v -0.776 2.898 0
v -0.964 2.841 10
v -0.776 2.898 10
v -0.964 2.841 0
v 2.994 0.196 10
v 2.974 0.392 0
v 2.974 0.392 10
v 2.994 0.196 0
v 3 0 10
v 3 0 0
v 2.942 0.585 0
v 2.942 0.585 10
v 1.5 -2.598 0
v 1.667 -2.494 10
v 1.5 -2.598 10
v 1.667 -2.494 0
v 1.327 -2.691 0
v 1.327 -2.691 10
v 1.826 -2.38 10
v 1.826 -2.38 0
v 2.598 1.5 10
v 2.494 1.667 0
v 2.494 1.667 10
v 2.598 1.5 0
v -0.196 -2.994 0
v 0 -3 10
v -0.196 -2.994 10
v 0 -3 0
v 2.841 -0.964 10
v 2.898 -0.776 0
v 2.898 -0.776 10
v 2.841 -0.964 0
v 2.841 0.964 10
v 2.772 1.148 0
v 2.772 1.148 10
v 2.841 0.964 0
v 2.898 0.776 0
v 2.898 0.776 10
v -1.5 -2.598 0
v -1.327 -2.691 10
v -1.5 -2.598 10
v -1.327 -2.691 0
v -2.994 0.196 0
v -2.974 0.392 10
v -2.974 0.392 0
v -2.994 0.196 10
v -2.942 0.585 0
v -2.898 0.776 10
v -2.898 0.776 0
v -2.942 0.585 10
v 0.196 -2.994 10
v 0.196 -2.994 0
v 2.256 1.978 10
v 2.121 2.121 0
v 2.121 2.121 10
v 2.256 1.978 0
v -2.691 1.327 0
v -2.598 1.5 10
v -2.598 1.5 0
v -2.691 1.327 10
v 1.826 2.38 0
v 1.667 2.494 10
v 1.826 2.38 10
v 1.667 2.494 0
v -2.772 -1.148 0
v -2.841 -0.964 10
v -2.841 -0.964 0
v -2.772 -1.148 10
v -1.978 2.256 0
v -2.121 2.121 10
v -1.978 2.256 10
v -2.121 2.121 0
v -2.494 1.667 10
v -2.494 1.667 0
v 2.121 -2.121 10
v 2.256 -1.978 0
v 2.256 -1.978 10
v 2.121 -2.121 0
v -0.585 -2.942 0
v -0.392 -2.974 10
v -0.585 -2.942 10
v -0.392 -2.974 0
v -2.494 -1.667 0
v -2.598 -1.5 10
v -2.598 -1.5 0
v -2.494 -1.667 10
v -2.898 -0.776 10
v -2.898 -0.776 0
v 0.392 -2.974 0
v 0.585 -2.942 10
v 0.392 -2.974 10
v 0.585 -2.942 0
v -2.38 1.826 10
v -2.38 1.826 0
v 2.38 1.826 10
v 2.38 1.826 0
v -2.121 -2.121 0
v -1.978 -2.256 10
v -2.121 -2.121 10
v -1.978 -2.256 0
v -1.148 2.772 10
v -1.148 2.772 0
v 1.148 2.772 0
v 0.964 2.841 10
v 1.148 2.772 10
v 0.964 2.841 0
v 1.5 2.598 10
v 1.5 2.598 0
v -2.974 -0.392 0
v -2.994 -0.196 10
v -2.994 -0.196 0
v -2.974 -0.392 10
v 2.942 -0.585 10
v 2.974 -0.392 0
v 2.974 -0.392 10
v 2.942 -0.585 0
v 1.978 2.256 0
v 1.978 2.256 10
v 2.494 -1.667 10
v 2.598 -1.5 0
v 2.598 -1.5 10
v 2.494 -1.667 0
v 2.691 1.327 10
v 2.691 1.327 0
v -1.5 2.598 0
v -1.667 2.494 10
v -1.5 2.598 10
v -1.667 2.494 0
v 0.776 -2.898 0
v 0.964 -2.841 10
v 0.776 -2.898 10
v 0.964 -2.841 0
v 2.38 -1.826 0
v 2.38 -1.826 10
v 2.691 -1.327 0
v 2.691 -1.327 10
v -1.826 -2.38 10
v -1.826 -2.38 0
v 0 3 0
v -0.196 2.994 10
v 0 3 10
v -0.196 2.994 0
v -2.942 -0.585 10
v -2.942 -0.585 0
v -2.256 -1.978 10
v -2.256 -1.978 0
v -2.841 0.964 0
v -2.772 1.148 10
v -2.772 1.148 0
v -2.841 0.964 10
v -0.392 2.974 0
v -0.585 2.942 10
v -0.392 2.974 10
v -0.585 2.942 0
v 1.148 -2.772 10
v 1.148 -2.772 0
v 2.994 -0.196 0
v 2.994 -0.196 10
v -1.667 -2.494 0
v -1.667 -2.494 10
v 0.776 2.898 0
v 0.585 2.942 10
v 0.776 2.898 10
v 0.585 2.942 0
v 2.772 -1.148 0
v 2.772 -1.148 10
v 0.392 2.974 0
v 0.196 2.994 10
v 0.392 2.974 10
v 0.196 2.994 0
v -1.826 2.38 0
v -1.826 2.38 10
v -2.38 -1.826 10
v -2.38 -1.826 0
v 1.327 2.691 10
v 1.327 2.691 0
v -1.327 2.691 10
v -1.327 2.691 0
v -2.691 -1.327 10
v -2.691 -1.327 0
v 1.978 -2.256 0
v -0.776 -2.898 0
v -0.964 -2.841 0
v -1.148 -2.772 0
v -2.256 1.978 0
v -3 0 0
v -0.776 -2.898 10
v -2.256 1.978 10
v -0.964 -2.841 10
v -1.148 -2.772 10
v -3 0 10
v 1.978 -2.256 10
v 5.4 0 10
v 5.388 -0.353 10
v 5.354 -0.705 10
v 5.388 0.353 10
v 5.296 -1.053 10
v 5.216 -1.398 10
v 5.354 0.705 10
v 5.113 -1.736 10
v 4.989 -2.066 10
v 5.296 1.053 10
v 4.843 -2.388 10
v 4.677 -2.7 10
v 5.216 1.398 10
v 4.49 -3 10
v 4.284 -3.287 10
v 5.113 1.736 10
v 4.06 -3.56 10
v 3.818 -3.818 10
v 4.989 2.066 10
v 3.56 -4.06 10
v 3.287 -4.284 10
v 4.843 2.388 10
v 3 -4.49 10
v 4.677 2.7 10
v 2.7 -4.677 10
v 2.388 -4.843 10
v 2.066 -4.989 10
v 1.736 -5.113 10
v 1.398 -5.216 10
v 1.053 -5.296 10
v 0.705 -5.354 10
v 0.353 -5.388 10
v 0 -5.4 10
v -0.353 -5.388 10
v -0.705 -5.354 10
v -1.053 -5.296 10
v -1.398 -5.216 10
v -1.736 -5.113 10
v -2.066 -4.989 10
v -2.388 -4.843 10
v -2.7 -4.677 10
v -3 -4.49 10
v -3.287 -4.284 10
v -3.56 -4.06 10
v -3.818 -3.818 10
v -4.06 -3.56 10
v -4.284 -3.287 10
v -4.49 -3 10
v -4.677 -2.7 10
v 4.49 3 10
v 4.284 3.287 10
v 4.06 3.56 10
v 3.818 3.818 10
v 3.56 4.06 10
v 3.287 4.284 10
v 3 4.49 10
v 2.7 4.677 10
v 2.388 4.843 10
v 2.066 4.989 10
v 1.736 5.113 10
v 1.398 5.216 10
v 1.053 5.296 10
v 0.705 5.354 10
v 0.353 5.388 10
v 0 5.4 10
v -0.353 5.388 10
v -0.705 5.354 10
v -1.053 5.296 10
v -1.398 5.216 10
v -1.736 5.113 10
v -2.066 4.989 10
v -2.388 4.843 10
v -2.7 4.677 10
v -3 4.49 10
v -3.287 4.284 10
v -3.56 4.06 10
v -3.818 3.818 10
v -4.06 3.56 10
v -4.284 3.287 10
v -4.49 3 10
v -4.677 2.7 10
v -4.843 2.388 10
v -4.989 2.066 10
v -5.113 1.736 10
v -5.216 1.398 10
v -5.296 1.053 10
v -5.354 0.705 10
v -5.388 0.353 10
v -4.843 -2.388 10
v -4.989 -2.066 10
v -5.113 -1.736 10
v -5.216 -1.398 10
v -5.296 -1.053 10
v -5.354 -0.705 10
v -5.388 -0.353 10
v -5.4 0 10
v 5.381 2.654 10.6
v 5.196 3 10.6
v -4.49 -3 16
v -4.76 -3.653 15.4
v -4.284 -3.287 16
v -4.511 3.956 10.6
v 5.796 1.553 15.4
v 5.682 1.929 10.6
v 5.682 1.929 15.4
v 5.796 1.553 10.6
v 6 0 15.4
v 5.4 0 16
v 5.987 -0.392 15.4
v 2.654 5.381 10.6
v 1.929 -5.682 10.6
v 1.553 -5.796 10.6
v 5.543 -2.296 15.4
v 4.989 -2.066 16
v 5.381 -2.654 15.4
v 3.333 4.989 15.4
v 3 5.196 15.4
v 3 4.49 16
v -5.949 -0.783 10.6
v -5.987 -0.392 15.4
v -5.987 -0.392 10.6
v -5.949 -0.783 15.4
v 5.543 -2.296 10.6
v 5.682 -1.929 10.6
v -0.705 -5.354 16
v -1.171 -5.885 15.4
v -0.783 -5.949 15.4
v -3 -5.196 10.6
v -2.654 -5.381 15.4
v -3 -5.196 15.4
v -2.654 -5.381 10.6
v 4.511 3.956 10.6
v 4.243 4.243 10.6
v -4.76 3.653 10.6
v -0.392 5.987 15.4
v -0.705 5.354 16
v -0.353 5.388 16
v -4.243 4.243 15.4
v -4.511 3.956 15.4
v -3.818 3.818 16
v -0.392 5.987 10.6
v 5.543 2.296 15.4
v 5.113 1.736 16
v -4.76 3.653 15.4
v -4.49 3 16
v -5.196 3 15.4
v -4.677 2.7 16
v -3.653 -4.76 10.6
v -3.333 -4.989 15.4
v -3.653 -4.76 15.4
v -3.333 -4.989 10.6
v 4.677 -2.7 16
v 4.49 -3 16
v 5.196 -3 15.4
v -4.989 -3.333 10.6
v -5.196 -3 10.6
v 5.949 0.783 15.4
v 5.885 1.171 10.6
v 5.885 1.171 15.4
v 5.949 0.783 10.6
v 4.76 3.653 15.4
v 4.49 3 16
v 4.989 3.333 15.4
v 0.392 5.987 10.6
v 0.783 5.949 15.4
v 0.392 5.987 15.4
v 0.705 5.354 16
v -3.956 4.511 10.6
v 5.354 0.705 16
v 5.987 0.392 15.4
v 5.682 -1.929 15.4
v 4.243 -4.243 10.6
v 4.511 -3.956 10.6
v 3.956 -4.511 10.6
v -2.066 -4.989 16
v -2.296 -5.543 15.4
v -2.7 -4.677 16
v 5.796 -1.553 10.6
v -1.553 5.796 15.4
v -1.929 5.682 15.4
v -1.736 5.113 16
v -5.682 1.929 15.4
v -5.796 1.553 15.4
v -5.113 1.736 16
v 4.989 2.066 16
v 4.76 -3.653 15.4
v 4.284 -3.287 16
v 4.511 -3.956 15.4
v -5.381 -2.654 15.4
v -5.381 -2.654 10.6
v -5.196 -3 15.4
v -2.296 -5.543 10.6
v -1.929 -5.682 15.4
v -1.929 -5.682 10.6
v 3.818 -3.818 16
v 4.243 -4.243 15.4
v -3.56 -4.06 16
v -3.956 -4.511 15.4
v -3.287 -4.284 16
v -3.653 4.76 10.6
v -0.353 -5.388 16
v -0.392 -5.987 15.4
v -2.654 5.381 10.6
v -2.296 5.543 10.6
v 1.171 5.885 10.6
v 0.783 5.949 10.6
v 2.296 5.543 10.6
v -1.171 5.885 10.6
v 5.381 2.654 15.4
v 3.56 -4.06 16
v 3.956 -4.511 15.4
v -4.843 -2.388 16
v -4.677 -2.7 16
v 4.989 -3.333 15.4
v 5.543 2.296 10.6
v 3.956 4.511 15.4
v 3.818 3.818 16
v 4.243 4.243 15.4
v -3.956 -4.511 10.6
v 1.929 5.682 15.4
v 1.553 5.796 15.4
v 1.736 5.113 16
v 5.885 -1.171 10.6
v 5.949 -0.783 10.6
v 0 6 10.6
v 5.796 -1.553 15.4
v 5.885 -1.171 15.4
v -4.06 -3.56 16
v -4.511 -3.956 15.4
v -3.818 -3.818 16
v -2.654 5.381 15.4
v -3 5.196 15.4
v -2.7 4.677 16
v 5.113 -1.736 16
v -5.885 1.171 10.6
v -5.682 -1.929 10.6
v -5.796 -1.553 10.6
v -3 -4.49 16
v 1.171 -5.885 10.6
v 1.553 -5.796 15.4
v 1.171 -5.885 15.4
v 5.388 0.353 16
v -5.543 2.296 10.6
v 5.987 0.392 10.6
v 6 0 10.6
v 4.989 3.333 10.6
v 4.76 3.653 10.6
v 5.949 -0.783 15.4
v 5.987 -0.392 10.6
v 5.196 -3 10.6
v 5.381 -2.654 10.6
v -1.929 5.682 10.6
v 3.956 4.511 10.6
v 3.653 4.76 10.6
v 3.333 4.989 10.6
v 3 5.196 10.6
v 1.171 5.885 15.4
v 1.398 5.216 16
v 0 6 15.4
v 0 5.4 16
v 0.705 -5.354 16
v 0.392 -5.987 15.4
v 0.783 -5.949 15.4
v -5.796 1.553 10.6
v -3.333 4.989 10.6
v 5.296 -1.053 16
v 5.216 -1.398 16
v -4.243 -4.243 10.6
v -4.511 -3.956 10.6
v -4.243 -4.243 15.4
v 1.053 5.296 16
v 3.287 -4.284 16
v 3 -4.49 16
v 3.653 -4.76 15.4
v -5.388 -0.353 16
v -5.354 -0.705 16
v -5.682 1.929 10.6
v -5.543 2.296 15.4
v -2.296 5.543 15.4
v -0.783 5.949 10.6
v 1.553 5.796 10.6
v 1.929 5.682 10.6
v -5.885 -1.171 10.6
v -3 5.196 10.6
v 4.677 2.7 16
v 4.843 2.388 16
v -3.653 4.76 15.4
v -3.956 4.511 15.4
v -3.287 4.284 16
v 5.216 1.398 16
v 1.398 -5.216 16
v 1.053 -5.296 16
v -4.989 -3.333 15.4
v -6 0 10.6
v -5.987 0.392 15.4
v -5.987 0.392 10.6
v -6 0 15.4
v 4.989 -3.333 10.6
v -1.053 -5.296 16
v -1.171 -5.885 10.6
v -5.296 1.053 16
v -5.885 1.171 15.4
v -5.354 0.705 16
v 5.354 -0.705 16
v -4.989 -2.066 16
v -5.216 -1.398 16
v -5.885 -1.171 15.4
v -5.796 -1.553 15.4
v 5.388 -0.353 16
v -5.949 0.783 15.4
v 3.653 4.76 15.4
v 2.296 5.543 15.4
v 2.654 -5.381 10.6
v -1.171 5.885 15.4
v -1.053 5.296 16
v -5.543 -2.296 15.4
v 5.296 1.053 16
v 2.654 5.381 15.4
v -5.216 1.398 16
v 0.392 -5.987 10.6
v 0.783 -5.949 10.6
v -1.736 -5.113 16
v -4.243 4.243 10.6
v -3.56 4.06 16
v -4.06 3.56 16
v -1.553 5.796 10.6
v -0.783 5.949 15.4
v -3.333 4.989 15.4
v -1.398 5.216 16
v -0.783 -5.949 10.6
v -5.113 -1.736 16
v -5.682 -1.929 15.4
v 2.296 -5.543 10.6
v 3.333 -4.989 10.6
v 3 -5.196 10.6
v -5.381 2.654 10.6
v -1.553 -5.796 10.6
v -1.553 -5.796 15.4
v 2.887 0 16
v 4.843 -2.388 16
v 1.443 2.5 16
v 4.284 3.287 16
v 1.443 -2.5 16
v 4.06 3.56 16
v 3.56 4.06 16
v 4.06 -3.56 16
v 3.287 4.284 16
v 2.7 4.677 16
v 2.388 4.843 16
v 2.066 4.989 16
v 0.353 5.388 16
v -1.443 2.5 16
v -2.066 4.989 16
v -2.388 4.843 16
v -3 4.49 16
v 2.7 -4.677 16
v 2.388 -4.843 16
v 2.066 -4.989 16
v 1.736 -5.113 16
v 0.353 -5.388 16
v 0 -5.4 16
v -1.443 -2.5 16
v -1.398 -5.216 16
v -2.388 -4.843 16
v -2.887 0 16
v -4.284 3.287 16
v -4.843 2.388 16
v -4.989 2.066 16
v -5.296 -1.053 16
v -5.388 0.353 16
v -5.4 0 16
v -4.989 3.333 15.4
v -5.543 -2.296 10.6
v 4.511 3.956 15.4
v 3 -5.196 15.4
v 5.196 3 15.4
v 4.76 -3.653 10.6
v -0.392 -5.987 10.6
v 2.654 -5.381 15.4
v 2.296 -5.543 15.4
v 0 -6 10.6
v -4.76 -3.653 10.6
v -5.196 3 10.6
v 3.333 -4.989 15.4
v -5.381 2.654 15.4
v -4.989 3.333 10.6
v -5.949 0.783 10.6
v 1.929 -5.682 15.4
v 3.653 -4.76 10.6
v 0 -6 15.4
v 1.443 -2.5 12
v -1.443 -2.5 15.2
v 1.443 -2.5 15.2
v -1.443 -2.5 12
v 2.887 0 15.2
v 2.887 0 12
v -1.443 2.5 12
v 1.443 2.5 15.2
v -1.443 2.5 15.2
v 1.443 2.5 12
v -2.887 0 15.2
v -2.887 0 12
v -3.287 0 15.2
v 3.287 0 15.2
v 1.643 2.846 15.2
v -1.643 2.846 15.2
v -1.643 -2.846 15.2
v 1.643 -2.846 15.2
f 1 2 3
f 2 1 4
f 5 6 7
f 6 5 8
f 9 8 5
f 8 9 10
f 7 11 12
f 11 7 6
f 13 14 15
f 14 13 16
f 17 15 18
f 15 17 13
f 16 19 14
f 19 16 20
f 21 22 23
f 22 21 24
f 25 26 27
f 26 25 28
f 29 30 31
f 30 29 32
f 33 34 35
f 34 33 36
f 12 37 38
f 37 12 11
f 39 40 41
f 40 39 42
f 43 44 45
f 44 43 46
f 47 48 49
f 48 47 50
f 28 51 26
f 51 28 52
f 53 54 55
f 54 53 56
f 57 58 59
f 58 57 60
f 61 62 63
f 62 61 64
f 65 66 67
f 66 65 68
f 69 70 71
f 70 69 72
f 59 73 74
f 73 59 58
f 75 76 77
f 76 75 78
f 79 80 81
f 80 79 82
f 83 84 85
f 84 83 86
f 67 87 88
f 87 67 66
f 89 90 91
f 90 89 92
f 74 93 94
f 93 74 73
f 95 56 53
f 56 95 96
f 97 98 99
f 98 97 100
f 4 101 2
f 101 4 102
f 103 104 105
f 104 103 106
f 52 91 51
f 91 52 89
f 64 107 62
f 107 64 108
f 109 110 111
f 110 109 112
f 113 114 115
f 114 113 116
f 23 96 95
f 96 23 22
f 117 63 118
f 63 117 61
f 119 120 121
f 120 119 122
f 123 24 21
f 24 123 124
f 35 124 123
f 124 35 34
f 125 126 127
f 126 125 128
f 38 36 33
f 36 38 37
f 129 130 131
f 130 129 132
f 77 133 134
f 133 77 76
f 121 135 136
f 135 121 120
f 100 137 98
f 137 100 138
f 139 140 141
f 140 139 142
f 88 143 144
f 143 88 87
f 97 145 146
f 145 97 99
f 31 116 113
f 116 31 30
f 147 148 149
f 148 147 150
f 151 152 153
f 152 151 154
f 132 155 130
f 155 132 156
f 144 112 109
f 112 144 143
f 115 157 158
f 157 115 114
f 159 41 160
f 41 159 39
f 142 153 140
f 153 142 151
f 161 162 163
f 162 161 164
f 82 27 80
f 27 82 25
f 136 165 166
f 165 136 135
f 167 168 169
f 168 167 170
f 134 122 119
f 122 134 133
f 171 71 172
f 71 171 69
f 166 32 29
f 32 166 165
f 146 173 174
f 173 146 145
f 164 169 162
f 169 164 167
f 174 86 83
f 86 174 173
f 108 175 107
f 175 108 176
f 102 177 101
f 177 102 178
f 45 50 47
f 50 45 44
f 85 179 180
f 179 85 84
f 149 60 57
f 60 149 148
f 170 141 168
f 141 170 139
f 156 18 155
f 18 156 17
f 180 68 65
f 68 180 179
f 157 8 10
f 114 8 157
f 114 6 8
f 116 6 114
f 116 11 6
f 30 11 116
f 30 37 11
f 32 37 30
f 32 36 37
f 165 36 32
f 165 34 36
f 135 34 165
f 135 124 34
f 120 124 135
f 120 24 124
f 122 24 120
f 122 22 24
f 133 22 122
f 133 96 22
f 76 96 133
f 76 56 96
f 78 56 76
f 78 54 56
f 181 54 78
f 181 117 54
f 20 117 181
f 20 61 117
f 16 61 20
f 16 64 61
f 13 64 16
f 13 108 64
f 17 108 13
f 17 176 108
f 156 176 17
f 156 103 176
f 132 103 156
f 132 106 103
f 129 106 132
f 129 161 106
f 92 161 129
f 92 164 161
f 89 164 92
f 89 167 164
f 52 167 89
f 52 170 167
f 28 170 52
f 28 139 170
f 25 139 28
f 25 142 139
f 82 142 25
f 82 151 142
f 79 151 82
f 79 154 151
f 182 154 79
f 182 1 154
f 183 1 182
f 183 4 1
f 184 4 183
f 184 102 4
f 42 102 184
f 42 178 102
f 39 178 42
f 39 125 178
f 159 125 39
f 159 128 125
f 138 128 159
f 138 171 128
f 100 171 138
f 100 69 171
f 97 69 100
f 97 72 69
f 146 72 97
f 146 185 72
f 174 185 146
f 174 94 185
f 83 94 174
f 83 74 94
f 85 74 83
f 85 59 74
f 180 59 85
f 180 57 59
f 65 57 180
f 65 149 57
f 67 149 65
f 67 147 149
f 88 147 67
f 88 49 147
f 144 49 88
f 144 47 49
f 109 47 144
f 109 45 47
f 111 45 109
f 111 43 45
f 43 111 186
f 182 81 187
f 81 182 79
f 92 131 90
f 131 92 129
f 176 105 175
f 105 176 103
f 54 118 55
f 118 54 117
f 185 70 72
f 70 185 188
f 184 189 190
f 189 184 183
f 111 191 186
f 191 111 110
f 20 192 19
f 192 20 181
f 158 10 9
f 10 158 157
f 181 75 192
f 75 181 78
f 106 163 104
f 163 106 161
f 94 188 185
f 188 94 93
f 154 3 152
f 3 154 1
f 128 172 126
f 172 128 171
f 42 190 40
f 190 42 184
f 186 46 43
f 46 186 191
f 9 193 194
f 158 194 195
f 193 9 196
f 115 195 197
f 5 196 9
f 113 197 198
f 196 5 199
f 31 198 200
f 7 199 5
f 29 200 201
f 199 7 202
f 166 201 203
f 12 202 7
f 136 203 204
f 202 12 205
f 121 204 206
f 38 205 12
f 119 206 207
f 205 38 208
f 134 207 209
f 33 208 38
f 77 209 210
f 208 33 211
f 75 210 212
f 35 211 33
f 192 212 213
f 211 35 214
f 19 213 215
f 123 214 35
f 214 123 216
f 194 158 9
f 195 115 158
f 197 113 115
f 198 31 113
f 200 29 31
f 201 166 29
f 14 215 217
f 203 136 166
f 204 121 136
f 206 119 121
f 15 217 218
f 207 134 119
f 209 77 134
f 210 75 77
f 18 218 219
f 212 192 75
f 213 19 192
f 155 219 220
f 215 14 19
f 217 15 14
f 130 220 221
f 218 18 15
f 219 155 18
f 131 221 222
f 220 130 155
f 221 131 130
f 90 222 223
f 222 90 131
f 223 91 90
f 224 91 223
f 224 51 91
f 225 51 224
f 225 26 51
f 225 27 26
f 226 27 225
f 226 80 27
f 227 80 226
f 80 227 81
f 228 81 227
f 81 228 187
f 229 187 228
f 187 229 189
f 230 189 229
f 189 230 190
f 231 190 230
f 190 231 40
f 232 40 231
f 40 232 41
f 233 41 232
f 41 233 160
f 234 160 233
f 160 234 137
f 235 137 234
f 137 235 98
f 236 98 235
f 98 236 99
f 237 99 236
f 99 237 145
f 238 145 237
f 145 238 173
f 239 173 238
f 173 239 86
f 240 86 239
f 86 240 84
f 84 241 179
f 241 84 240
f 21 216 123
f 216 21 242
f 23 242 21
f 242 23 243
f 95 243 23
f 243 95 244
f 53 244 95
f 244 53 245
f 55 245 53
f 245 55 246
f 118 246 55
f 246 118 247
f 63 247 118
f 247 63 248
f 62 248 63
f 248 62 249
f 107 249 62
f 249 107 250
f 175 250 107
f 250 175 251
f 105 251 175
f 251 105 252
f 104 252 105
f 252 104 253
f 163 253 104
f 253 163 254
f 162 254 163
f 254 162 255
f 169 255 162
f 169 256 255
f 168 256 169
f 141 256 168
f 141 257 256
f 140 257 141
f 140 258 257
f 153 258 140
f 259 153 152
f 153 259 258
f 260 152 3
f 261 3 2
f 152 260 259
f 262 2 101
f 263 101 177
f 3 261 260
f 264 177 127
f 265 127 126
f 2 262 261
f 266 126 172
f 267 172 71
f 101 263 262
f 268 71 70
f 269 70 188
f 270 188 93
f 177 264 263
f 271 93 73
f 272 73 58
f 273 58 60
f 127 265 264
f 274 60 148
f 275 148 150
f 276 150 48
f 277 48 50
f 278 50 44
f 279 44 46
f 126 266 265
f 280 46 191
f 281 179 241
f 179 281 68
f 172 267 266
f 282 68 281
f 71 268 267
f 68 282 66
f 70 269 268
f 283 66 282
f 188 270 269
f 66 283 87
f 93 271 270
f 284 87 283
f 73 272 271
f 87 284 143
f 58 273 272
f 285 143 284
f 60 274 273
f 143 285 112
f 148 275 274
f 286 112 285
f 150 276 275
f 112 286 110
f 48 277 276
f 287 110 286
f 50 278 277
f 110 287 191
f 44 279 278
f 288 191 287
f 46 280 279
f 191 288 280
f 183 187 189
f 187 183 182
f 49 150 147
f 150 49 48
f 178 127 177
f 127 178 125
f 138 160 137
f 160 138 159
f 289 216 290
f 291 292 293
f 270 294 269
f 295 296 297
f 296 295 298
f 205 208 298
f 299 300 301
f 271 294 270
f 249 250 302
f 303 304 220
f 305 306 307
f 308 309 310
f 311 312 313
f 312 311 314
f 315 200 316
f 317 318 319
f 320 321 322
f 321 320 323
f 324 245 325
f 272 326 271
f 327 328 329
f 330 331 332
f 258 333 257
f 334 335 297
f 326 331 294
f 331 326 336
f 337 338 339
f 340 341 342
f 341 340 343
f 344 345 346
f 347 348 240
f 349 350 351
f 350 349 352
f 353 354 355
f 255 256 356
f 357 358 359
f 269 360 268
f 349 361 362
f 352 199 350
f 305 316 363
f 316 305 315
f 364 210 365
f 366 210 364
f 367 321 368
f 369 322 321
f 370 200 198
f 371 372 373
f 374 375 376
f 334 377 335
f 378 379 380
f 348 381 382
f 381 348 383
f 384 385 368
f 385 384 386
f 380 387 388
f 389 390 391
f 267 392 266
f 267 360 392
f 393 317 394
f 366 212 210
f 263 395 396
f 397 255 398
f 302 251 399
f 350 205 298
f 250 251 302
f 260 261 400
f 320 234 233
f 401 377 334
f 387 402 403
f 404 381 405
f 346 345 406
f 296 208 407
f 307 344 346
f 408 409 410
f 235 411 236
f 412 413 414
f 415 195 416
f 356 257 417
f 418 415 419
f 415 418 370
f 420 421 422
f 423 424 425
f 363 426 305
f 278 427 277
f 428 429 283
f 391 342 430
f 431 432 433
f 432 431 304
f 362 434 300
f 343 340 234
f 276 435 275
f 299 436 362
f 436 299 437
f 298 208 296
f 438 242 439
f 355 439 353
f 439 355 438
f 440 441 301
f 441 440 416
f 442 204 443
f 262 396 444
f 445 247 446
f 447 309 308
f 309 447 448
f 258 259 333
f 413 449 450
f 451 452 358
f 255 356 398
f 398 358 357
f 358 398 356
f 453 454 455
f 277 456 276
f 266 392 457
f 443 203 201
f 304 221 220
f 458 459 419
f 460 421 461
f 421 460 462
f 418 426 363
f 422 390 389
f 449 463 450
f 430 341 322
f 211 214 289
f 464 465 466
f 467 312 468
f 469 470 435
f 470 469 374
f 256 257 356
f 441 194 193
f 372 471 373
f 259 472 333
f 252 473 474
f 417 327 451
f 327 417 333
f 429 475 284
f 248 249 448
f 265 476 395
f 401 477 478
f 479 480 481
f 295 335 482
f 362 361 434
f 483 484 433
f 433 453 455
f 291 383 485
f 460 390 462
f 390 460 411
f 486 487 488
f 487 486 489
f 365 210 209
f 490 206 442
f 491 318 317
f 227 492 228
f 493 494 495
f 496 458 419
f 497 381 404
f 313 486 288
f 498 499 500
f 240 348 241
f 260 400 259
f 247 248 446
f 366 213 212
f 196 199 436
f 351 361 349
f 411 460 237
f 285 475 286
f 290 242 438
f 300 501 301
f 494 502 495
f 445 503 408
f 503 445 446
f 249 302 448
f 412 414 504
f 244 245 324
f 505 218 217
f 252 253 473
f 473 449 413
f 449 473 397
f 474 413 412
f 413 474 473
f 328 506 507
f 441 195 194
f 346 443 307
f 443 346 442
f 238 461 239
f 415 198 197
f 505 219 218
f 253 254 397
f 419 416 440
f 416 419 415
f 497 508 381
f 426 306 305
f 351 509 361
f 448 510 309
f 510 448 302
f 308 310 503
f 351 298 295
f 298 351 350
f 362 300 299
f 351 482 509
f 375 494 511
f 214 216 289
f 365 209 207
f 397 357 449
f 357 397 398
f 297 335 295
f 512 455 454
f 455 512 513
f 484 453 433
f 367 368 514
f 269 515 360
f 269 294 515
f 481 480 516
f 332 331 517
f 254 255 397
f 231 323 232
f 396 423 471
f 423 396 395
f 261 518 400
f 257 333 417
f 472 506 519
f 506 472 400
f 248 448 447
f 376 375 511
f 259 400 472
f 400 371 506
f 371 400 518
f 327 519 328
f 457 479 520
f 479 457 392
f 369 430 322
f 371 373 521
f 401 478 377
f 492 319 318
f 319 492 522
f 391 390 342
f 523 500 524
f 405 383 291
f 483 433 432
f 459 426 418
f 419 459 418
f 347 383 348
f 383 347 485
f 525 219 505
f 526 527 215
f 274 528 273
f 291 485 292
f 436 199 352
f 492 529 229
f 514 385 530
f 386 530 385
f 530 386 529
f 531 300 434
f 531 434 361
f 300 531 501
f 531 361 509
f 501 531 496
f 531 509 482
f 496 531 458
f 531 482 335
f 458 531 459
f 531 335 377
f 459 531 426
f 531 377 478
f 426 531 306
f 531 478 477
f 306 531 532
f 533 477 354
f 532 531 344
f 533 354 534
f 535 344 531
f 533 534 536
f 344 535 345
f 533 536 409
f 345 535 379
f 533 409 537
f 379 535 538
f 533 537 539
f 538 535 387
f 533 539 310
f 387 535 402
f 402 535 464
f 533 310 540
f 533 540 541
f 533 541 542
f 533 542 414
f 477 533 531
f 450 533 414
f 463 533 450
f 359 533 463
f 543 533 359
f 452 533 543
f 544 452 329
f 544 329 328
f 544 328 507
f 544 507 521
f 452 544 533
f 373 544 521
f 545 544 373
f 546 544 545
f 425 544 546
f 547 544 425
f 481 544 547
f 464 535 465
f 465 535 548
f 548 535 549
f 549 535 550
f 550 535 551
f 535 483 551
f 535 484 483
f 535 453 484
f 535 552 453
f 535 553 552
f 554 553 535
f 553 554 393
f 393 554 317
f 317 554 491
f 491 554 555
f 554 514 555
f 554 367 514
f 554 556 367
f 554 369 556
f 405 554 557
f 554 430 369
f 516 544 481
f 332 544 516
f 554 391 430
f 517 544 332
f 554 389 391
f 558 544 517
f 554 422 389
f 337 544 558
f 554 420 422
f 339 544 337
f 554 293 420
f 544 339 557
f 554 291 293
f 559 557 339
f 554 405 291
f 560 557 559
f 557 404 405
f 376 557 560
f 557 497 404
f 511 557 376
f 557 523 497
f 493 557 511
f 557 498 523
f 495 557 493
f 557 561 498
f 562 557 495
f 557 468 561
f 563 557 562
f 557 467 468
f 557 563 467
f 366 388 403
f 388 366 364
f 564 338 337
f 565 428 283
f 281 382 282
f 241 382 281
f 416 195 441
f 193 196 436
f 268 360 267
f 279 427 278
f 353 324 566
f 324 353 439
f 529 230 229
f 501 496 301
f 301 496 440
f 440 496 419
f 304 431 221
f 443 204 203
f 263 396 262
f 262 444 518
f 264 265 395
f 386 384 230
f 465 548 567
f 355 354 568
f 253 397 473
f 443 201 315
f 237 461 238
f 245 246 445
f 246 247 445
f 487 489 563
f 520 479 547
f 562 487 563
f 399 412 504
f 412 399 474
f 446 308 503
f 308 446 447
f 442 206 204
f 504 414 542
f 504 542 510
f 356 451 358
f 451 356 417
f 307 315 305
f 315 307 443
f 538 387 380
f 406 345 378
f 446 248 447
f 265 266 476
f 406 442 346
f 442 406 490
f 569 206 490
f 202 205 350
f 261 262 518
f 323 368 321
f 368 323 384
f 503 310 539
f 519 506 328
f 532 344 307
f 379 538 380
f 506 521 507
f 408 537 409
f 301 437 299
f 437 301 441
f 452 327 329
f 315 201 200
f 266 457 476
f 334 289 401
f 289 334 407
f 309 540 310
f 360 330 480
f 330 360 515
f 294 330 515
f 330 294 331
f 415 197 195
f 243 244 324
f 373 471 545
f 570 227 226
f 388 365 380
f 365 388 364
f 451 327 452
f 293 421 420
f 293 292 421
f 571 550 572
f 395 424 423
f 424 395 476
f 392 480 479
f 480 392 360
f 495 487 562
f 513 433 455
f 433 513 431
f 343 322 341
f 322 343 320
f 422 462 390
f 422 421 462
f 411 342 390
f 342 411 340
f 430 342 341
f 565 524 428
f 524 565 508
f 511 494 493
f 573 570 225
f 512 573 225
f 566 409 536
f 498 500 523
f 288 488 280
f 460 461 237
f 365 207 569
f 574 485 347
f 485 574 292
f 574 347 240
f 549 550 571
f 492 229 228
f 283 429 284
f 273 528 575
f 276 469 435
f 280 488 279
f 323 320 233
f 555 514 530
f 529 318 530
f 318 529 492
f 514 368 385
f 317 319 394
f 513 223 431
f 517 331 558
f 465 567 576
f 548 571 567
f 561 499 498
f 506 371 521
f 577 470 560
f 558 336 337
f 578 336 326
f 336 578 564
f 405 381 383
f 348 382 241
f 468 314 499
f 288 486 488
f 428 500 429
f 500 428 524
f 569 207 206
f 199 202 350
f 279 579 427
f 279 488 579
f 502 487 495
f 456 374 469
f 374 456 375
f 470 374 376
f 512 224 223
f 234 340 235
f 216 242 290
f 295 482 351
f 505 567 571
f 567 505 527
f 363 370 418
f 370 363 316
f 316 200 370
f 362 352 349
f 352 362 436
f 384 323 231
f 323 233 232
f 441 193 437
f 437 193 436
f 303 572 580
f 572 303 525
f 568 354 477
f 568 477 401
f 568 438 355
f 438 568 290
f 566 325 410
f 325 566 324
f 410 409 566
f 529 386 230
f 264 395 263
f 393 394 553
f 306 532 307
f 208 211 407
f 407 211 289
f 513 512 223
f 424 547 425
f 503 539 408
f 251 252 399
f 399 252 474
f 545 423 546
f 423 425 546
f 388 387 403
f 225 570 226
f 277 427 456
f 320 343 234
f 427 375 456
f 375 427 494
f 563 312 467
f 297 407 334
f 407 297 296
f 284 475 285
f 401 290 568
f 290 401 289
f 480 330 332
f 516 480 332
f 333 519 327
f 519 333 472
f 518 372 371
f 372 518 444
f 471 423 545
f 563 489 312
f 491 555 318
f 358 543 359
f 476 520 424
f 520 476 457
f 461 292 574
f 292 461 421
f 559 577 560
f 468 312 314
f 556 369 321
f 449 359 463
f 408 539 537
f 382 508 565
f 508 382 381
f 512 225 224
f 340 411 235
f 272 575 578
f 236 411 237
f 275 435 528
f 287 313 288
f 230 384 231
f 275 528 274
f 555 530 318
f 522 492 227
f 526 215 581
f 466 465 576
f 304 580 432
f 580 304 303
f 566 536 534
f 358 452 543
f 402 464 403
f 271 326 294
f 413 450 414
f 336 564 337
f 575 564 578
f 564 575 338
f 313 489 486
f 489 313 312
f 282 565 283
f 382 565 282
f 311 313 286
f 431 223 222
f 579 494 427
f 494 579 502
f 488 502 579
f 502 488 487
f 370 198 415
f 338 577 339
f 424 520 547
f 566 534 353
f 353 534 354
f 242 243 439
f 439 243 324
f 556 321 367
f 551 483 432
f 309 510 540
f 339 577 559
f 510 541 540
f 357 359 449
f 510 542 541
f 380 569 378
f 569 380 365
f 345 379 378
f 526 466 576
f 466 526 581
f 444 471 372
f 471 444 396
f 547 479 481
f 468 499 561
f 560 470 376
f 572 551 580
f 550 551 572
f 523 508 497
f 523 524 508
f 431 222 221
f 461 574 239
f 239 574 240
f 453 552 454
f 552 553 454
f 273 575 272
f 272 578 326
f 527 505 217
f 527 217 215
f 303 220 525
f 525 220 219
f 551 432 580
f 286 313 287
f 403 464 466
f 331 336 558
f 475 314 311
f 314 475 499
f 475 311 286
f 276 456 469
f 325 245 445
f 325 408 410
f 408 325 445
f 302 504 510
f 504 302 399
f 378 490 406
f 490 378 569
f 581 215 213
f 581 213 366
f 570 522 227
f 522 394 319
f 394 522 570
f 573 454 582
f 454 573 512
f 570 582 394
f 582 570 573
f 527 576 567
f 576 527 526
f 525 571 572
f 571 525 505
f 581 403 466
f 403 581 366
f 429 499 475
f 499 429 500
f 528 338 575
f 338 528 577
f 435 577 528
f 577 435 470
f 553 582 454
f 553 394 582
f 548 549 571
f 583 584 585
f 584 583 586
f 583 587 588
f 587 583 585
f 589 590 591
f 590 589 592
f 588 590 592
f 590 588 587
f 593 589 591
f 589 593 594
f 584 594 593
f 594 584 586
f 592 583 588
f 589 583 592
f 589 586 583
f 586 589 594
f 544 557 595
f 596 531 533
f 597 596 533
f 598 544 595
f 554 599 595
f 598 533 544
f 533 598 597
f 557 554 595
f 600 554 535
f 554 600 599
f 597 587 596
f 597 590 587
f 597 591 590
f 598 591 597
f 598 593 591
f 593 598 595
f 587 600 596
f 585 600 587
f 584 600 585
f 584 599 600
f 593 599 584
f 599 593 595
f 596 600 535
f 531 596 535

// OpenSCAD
$fn = 96;

d_shaft = 6.0;
l_shaft = 10.0;

d_head  = 12.0;
h_head  = 6.0;

hex_flat = 5.0;          // approximate for M6 socket
hex_depth = 4.0;         // approximate socket depth
hex_corner = hex_flat / cos(30);

chamfer = 0.6;

module chamfered_cylinder(d, h, c=0.5) {
    // simple top/bottom chamfer via hull of two cylinders
    hull() {
        translate([0,0,0]) cylinder(d=d-2*c, h=0.01);
        translate([0,0,c]) cylinder(d=d, h=h-2*c);
        translate([0,0,h-0.01]) cylinder(d=d-2*c, h=0.01);
    }
}

module socket_head_cap_screw() {
    difference() {
        union() {
            // shaft
            cylinder(d=d_shaft, h=l_shaft);

            // head
            translate([0,0,l_shaft])
                chamfered_cylinder(d=d_head, h=h_head, c=chamfer);
        }

        // hex socket
        translate([0,0,l_shaft + h_head - hex_depth])
            cylinder(r=hex_corner/2, h=hex_depth + 0.2, $fn=6);

        // slight entry chamfer for socket
        translate([0,0,l_shaft + h_head - 0.8])
            cylinder(r1=hex_corner/2 + 0.4, r2=hex_corner/2, h=0.8, $fn=6);
    }
}

socket_head_cap_screw();
